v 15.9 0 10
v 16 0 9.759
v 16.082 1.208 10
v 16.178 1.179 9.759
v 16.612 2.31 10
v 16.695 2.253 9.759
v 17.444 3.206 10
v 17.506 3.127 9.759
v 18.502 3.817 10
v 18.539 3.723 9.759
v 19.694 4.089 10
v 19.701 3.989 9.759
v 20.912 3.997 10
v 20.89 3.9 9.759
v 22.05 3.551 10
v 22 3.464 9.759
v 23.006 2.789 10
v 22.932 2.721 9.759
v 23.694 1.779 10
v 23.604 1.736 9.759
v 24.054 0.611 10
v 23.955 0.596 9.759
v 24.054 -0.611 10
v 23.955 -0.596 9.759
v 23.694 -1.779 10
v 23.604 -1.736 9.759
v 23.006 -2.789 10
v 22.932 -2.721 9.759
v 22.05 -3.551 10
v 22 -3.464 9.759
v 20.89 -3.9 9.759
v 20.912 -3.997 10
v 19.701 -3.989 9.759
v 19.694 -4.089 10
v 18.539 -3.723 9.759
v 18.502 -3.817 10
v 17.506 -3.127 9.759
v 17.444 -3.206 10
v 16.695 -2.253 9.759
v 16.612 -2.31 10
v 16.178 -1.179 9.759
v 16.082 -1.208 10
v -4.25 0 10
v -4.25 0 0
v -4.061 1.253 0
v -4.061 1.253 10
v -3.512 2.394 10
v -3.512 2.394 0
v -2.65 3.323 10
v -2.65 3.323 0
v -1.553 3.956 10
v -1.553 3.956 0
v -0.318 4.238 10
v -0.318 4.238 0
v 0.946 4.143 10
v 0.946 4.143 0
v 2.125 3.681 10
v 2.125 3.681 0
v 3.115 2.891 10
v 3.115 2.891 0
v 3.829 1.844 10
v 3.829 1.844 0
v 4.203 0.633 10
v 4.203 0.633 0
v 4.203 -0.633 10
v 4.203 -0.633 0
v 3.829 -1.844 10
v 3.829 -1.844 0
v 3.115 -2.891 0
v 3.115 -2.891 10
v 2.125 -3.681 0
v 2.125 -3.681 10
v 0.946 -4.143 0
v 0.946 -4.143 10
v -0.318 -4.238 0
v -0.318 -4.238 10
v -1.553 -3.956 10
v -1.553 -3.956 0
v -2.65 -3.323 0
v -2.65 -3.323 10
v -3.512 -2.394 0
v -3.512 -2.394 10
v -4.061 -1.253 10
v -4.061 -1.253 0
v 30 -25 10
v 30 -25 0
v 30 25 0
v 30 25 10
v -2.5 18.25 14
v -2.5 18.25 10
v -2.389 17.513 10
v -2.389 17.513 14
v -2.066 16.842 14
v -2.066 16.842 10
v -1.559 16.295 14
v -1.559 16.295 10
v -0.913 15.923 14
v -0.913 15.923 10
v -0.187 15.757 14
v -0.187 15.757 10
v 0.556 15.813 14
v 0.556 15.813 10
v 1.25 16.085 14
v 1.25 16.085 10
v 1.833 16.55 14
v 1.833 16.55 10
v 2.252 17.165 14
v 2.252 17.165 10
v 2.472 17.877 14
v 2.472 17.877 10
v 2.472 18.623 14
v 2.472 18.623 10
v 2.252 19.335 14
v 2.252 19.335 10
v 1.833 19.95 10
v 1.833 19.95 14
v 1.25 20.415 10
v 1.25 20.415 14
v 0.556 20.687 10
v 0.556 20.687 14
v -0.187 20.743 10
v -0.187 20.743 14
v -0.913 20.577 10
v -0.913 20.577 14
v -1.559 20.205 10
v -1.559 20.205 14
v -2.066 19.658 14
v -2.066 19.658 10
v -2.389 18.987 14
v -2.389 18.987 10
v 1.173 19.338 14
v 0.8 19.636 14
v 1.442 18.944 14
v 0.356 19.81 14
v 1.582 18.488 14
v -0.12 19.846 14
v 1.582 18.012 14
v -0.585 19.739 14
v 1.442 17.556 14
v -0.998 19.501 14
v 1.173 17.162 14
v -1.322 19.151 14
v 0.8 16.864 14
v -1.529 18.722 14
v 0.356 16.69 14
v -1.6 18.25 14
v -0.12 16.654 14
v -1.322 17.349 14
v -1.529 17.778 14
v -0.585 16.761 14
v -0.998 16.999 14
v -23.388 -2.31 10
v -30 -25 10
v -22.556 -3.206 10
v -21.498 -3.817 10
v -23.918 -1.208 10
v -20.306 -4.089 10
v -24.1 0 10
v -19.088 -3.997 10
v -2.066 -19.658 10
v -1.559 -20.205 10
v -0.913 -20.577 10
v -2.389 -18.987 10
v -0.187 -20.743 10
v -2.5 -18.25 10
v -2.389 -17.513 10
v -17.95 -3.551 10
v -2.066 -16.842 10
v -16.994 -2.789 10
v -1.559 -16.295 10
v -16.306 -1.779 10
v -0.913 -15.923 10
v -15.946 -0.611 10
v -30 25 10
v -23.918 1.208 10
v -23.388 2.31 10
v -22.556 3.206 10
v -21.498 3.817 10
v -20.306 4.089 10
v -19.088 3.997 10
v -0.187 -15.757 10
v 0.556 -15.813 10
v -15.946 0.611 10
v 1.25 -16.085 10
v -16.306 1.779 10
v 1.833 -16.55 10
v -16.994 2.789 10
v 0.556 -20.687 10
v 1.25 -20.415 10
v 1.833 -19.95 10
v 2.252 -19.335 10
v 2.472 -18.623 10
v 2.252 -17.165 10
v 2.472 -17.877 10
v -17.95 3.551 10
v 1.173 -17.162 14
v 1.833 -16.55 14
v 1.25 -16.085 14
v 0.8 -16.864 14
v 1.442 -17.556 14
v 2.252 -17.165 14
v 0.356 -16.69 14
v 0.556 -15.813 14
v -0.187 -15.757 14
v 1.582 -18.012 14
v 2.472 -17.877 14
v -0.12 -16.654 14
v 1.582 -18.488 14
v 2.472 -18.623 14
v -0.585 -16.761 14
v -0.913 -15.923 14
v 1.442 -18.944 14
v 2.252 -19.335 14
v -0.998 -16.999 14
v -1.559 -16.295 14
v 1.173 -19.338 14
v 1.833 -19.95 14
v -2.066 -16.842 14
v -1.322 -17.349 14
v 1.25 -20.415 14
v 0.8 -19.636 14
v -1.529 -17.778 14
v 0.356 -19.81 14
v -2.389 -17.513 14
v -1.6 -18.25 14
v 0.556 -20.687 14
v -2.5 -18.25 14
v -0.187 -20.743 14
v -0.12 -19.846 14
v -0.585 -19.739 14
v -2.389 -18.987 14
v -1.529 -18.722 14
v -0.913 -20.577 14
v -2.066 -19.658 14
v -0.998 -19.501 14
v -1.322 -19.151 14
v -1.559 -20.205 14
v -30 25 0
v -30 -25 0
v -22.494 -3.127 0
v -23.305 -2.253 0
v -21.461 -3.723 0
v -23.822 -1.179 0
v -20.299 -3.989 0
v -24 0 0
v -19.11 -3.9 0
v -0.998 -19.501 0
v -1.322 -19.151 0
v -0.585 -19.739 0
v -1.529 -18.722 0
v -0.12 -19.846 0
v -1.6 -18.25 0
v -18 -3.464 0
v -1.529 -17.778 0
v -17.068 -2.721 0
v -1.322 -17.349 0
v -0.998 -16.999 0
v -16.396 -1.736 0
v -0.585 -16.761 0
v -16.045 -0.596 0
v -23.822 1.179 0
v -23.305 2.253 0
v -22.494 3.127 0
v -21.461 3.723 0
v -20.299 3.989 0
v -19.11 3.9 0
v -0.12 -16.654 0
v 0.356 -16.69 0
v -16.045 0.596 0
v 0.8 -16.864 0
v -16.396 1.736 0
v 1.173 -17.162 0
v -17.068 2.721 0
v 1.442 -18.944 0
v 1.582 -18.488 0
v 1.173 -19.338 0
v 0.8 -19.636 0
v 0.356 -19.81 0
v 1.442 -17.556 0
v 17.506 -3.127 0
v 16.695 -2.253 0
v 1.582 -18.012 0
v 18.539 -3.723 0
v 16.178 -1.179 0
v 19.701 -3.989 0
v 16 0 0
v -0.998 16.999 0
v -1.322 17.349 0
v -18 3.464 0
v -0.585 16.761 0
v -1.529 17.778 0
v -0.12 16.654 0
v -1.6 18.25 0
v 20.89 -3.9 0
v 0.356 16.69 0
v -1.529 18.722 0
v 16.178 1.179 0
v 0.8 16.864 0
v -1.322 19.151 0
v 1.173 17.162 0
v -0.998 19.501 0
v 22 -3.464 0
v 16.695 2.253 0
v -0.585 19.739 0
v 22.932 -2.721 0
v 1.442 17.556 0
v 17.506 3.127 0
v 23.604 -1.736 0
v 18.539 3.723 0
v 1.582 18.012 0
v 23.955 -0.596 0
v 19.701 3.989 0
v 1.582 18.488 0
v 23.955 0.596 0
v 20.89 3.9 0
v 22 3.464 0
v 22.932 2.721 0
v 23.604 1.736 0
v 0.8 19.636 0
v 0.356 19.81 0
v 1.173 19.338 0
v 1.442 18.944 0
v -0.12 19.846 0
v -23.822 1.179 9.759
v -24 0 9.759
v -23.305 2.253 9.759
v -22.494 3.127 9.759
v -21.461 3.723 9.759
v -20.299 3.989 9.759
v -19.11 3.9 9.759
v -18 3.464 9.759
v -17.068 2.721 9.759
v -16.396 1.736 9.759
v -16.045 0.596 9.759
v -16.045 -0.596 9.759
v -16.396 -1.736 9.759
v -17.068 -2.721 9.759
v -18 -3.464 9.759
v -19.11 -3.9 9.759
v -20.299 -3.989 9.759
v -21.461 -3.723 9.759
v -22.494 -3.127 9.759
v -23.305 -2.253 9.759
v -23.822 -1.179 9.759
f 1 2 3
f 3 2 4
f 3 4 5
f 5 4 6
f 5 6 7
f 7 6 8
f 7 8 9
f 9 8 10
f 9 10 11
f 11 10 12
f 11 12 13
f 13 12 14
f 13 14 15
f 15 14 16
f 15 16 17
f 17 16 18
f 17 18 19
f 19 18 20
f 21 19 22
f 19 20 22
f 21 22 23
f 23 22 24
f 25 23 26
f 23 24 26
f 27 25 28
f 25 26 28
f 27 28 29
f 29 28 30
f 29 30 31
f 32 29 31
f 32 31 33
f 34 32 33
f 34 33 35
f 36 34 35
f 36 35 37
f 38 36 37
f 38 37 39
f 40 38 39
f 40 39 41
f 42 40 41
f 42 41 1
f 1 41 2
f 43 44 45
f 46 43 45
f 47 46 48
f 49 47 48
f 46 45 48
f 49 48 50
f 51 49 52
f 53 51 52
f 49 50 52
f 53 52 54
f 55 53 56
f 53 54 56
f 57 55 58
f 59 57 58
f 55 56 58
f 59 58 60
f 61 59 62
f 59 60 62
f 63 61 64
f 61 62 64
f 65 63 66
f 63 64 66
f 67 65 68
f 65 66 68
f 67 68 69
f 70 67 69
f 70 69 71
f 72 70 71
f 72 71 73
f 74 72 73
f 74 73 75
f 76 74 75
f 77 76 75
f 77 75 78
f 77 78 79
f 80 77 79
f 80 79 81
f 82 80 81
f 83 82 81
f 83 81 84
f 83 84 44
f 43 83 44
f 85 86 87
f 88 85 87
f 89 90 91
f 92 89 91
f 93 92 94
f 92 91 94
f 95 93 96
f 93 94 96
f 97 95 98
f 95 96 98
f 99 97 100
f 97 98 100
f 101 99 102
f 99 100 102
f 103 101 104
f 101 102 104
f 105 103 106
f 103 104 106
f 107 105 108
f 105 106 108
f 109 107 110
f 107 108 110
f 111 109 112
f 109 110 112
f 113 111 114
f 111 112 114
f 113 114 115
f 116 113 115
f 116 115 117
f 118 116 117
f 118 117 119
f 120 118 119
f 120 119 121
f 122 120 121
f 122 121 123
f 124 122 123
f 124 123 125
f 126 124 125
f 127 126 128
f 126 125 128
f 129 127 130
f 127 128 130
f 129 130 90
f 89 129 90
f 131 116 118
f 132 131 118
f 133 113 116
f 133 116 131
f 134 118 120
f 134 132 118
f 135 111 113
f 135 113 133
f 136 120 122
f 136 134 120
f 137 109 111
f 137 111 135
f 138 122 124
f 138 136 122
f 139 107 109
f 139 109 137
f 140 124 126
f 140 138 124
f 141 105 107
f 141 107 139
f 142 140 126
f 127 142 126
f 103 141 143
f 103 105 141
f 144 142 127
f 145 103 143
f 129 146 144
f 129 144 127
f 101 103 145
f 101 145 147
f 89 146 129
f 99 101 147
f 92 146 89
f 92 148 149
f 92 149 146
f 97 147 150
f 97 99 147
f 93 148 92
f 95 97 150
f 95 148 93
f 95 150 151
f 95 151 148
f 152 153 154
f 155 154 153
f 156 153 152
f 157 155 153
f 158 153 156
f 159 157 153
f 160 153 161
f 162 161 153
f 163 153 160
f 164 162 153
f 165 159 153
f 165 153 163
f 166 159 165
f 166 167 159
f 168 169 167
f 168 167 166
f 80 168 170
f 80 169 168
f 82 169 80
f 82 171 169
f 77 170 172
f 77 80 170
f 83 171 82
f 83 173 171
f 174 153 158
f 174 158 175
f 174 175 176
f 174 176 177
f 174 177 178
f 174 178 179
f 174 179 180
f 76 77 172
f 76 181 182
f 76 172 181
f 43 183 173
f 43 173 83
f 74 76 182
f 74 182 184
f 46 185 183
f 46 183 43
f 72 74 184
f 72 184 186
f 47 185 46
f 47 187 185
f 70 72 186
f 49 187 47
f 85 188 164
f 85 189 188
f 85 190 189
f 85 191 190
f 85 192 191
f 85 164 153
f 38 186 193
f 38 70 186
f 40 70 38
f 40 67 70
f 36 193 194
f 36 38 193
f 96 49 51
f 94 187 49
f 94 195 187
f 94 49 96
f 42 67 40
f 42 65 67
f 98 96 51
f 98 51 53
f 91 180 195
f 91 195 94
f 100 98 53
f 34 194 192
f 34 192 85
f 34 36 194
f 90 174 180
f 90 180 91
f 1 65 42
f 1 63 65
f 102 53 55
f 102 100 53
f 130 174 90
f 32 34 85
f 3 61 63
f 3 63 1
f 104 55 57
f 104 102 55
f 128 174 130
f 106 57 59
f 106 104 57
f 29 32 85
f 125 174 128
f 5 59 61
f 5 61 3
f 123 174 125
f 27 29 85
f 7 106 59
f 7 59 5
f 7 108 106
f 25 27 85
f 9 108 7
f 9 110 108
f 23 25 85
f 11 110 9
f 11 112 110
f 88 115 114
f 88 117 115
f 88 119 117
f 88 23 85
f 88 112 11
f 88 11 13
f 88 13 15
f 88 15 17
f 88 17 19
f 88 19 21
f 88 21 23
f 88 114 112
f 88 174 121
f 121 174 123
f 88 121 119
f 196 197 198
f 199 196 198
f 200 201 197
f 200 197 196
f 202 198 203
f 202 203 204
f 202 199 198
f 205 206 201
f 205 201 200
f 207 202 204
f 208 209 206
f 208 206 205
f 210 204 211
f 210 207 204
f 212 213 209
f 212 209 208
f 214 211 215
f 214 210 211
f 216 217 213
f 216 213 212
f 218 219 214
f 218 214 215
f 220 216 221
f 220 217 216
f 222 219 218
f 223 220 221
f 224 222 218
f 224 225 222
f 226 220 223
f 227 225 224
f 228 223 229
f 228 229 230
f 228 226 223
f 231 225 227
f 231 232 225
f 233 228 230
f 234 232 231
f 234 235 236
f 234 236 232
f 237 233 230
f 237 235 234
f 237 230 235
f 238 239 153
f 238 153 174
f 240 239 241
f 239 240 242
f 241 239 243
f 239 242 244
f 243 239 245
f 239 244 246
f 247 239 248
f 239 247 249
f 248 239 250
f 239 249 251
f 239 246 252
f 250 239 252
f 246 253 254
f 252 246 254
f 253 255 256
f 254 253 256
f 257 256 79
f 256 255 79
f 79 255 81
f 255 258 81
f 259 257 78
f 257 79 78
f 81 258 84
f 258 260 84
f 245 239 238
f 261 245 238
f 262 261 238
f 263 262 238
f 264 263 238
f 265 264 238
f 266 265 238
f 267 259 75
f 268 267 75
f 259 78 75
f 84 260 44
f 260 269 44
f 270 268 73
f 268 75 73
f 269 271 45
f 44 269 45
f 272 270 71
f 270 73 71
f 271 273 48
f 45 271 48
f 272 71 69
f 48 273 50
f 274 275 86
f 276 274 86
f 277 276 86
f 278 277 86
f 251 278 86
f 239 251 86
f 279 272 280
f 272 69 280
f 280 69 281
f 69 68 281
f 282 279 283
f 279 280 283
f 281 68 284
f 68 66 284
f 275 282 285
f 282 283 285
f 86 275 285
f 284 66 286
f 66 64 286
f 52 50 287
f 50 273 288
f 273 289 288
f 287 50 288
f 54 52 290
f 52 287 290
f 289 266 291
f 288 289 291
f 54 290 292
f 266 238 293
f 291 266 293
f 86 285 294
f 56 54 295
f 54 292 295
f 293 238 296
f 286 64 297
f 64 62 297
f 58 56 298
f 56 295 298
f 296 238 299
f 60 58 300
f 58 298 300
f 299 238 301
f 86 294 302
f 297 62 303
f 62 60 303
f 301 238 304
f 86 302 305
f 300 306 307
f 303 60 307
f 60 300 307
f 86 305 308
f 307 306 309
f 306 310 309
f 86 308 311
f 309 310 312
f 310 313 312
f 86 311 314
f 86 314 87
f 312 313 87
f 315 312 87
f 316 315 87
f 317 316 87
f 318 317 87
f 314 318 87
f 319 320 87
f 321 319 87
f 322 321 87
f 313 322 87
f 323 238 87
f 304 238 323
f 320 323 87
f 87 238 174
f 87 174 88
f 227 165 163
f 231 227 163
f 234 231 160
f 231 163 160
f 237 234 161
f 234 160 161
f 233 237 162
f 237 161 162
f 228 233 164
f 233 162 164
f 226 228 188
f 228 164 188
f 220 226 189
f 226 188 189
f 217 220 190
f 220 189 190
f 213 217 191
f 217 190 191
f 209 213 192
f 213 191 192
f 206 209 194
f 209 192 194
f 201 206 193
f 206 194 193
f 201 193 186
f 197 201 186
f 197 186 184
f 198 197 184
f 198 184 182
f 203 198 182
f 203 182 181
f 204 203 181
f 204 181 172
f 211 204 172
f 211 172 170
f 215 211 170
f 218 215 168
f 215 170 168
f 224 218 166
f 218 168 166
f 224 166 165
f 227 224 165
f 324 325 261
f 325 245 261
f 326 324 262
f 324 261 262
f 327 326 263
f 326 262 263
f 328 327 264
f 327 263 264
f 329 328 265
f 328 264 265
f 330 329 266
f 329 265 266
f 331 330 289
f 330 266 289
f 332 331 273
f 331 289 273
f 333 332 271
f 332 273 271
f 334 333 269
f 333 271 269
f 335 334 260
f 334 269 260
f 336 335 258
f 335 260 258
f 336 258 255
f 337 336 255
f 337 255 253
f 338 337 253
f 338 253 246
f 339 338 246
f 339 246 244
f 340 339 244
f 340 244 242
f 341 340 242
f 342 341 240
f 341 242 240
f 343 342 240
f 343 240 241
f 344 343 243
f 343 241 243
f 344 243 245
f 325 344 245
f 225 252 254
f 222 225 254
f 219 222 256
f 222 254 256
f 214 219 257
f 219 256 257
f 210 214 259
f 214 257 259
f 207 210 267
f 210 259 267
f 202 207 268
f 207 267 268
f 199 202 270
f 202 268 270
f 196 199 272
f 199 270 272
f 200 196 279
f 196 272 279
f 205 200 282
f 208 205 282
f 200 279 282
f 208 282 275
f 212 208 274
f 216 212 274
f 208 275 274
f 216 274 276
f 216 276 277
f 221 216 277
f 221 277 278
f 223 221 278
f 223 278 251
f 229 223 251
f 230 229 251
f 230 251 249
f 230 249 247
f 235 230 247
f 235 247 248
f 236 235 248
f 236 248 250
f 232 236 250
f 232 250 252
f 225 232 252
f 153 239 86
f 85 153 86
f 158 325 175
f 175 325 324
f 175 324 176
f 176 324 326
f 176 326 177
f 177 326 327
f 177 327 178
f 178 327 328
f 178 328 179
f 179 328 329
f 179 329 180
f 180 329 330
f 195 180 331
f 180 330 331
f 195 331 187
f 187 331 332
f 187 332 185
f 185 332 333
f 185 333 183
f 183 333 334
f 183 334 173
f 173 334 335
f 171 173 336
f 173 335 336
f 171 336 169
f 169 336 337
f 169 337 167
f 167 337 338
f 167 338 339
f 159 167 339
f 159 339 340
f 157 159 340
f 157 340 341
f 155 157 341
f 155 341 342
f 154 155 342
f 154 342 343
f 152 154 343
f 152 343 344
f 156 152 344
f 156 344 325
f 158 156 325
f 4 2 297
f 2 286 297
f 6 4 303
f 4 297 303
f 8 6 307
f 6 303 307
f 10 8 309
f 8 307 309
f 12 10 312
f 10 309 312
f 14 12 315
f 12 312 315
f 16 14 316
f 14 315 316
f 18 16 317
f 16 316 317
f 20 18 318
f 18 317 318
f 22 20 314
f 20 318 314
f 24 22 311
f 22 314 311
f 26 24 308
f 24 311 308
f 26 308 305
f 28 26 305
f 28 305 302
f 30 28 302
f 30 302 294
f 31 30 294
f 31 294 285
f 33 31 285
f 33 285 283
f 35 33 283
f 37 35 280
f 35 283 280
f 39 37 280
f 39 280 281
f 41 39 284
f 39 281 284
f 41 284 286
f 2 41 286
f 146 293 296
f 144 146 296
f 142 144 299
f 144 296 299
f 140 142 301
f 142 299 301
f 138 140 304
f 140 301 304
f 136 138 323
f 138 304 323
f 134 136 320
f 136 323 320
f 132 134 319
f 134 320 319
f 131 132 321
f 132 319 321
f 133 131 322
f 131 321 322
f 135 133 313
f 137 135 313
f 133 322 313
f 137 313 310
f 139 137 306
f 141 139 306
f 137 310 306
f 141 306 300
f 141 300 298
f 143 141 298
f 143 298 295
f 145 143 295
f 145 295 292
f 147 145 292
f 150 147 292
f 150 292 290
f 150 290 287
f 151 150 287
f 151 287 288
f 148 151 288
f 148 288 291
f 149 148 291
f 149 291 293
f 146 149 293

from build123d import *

# Parameters (mm, degrees)
SKETCH_1_W                = 60
SKETCH_1_H                = 50
EXTRUDE_1_DEPTH           = 10
HOLE_WIZARD_1_D           = 8.5
HOLE_WIZARD_1_DEPTH       = 20
HOLE_WIZARD_2_D           = 8
HOLE_WIZARD_2_CSINK_D     = 8.2
HOLE_WIZARD_2_CSINK_ANGLE = 45
SKETCH_9_R                = 2.5
EXTRUDE_3_DEPTH           = 4
HOLE_WIZARD_3_D           = 3.2


with BuildPart() as part:
    # 草图1 → 凸台-拉伸1 (new body)
    with BuildSketch(Plane.XY):
        Rectangle(SKETCH_1_W, SKETCH_1_H)
    extrude(amount=EXTRUDE_1_DEPTH)

    # 孔1
    with Locations(Plane.XY.offset(10)):
        with Locations((0, 0)):
            Hole(HOLE_WIZARD_1_D / 2, depth=HOLE_WIZARD_1_DEPTH)

    # 孔2 (through all)
    with Locations(Plane.XY.offset(10)):
        with Locations((20, 0), (-20, 0)):
            CounterSinkHole(HOLE_WIZARD_2_D / 2, HOLE_WIZARD_2_CSINK_D / 2, counter_sink_angle=HOLE_WIZARD_2_CSINK_ANGLE)

    # 草图9 → 凸台-拉伸3 (add)
    with BuildSketch(Plane.XY.offset(10)):
        with Locations(Location((0, 18.25, 0), (0, 0, 180))):
            Circle(SKETCH_9_R)
        with Locations(Location((0, -18.25, 0), (0, 0, 180))):
            Circle(SKETCH_9_R)
    extrude(amount=EXTRUDE_3_DEPTH)

    # 孔3 (through all)
    with Locations(Plane.XY.offset(14)):
        with Locations((0, 18.25), (0, -18.25)):
            Hole(HOLE_WIZARD_3_D / 2)


solid = part.part
